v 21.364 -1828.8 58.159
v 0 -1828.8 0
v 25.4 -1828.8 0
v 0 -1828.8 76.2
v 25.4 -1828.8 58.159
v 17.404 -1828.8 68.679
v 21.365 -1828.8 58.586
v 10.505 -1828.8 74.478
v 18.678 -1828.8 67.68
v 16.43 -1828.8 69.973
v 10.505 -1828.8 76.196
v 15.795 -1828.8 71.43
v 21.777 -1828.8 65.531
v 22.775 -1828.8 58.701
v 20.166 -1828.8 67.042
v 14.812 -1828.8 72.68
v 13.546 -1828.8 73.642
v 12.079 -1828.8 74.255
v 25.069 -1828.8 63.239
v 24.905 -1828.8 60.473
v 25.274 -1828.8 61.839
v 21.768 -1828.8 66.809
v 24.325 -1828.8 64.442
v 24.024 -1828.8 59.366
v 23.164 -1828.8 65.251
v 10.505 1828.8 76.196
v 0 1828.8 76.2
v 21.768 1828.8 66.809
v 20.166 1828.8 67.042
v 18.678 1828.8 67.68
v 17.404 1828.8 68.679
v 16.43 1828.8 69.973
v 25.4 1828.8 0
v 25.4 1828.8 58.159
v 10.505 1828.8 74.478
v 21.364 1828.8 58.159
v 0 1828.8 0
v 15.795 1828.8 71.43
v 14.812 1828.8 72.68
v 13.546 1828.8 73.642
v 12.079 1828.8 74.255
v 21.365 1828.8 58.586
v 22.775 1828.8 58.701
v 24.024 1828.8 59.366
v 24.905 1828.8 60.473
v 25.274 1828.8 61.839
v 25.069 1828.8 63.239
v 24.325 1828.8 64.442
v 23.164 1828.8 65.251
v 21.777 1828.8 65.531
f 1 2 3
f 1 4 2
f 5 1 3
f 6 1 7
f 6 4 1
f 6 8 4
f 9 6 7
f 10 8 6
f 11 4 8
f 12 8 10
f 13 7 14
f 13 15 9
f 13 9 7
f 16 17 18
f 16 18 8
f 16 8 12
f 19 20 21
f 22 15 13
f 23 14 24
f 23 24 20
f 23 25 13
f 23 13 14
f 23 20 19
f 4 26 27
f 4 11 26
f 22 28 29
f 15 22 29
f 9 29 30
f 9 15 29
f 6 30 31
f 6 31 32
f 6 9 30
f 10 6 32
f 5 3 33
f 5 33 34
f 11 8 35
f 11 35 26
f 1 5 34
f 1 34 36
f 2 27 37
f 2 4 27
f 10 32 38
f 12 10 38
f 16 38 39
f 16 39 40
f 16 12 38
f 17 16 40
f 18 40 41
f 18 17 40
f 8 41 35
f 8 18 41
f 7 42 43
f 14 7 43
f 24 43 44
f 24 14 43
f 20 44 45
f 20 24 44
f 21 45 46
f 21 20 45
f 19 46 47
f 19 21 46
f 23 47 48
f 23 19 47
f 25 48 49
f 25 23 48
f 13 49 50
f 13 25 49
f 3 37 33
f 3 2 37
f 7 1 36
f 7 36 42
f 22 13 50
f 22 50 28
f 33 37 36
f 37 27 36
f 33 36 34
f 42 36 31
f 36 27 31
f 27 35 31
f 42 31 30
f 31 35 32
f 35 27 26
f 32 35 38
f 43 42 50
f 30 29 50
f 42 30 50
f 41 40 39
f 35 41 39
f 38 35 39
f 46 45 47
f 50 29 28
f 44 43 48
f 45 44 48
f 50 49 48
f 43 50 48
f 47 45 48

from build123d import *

# Parameters (mm, degrees)
F1_DEPTH      = 1828.8
F1_DEPTH_BACK = 1828.8


with BuildPart() as f1:
    # F0 (on Front) → F1 (new body, two sides)
    with BuildSketch(Plane.XZ) as f1_sk:
        with BuildLine():
            Line((0, 0), (25.4, 0))
            Line((25.4, 0), (25.4, 58.158721))
            Line((25.4, 58.158721), (21.36416, 58.158721))
            Line((21.36416, 58.158721), (21.365102, 58.586036))
            ThreePointArc((21.365102, 58.586036), (25.273677, 61.839096), (21.777011, 65.531343))
            Line((21.777011, 65.531343), (21.767992, 66.80916))
            ThreePointArc((21.767992, 66.80916), (18.677649, 67.679586), (16.430408, 69.972566))
            ThreePointArc((16.430408, 69.972566), (14.209961, 73.201589), (10.504975, 74.478325))
            Line((10.504975, 74.478325), (10.505155, 76.195857))
            Line((10.505155, 76.195857), (0, 76.2))
            Line((0, 76.2), (0, 0))
        make_face()
    extrude(amount=F1_DEPTH)
    extrude(f1_sk.sketch, amount=-F1_DEPTH_BACK)


solid = f1.part
